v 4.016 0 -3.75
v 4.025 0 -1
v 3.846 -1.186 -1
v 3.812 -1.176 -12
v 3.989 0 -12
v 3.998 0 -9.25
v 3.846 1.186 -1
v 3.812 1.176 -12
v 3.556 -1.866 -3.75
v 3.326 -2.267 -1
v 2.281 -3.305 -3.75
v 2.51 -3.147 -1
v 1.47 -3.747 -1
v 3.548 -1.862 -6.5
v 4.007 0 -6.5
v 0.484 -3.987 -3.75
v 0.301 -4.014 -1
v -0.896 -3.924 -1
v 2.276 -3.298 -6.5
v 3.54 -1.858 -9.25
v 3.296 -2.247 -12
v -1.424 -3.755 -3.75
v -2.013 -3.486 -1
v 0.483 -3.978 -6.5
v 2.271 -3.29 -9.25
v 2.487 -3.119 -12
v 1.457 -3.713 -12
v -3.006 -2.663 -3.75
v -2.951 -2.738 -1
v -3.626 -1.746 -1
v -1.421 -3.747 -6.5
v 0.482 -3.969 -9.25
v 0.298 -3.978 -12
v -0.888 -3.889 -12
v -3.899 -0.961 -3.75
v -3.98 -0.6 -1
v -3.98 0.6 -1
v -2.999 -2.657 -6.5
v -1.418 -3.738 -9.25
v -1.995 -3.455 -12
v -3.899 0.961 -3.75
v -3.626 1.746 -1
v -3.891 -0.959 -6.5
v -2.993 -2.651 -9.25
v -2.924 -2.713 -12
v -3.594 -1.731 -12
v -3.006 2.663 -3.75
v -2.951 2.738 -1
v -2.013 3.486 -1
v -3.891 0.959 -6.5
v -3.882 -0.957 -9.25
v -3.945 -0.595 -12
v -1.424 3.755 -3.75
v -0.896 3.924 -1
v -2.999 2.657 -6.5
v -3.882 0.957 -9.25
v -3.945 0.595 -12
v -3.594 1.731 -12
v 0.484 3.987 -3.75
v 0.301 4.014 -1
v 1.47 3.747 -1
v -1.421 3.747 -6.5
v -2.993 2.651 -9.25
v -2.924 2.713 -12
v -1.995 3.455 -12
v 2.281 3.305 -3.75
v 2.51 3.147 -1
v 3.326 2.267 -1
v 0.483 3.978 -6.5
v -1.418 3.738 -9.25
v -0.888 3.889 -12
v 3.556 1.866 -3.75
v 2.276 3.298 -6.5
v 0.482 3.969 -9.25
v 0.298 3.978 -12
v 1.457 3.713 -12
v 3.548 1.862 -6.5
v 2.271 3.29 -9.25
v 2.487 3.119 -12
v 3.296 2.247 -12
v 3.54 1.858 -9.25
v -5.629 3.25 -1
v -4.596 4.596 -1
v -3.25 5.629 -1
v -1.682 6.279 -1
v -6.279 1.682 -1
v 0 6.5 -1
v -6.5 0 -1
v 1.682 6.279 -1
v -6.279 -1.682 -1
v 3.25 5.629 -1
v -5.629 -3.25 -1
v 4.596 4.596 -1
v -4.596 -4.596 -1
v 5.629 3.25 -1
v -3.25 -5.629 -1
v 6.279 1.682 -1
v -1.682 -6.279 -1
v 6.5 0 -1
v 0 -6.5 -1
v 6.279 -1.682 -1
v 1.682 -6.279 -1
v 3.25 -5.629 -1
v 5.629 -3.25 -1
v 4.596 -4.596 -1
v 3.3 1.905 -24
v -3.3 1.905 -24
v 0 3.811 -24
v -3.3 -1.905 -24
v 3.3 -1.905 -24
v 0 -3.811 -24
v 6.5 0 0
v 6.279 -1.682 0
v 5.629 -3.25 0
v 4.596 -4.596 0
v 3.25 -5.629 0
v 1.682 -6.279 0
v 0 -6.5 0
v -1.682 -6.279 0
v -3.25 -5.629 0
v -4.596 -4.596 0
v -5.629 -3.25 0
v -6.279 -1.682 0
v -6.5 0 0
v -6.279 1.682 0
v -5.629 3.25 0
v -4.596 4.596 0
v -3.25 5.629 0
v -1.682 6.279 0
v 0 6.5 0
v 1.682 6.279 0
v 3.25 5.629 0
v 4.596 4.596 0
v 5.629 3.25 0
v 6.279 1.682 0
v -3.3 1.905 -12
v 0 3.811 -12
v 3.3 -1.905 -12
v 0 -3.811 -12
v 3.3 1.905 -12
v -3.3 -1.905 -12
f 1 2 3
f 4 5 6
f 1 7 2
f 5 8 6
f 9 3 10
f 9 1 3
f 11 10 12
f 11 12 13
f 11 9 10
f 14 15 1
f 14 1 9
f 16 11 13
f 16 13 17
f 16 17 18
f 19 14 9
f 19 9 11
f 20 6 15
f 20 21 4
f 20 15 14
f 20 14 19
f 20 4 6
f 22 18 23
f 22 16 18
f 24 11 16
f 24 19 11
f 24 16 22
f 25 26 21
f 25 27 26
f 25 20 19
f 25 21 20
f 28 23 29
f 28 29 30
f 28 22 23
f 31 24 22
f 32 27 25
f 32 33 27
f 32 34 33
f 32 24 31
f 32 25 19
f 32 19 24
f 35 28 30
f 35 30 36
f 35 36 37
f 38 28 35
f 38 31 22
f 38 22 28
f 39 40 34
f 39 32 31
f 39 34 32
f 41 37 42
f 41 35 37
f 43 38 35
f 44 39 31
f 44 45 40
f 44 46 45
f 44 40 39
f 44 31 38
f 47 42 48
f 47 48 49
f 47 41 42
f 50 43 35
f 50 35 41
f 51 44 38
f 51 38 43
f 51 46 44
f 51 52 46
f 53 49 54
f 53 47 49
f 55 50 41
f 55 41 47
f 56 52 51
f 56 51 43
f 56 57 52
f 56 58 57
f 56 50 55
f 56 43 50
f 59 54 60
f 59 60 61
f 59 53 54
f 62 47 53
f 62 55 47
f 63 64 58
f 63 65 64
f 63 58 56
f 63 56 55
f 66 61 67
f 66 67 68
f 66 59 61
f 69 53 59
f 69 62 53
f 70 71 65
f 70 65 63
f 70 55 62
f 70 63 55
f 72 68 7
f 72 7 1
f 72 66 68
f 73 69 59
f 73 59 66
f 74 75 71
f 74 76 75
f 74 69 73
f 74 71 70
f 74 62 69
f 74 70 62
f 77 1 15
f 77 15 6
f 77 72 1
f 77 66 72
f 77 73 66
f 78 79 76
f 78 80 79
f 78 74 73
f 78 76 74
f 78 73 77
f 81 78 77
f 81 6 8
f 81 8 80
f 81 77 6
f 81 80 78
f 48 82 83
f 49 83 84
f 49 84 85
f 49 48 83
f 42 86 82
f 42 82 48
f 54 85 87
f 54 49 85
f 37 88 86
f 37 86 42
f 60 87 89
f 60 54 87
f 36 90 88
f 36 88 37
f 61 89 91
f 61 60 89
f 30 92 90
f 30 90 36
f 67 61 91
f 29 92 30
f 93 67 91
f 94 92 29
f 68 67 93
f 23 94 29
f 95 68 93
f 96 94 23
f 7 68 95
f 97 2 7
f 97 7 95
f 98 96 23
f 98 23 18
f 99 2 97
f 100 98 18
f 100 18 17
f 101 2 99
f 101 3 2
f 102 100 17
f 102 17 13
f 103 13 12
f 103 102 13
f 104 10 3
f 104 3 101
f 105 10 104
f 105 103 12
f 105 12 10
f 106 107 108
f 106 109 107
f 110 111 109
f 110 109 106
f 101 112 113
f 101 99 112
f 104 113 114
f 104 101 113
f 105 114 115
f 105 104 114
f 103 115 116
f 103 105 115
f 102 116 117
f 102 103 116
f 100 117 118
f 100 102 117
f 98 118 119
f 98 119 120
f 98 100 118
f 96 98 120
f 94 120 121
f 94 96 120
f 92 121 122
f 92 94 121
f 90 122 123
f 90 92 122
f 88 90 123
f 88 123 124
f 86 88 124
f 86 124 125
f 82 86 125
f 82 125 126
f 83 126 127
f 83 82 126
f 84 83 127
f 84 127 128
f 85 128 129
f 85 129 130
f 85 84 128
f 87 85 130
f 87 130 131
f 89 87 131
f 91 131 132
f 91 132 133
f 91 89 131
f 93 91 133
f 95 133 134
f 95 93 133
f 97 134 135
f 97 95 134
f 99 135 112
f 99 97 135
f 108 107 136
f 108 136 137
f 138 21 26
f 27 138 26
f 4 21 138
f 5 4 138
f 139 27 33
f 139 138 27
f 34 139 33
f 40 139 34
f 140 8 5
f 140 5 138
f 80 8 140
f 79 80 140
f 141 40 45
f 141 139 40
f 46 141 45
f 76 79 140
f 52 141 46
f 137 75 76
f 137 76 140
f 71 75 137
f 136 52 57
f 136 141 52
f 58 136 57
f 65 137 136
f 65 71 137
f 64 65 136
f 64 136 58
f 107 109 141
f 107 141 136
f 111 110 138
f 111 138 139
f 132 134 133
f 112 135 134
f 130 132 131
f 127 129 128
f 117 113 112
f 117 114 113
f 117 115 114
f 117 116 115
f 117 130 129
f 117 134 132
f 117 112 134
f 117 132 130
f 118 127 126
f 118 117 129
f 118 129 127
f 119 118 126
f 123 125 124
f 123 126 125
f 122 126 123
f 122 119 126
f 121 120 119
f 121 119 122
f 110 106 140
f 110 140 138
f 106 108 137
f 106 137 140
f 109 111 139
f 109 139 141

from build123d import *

# Parameters (mm, degrees)
SZKIC4_R                   = 5.19169257
WYTNIJ_WYCI_GNI_CIE3_DEPTH = 12


with BuildPart() as part:
    # Szkic3 → Obrót1 (revolve)
    with BuildSketch(Plane(origin=(0, 0, 0), x_dir=(0, 0, -1), z_dir=(1, 0, 0))):
        Polygon((0, 0), (0, 6.5), (1, 6.5), (1, 4.025), (24, 3.95), (24, 0), align=None)
    revolve(axis=Axis((0, 0, 0), (0, 0, -1)))

    # Szkic4 → Wytnij-wyciągnięcie3 (cut)
    with BuildSketch(Plane(origin=(0, 0, -24), x_dir=(-1, 0, 0), z_dir=(0, 0, -1))):
        Circle(SZKIC4_R)
        Polygon((0, 3.810511777), (-3.3, 1.905255888), (-3.3, -1.905255888), (0, -3.810511777), (3.3, -1.905255888), (3.3, 1.905255888), align=None, mode=Mode.SUBTRACT)
    extrude(amount=-WYTNIJ_WYCI_GNI_CIE3_DEPTH, mode=Mode.SUBTRACT)


solid = part.part
